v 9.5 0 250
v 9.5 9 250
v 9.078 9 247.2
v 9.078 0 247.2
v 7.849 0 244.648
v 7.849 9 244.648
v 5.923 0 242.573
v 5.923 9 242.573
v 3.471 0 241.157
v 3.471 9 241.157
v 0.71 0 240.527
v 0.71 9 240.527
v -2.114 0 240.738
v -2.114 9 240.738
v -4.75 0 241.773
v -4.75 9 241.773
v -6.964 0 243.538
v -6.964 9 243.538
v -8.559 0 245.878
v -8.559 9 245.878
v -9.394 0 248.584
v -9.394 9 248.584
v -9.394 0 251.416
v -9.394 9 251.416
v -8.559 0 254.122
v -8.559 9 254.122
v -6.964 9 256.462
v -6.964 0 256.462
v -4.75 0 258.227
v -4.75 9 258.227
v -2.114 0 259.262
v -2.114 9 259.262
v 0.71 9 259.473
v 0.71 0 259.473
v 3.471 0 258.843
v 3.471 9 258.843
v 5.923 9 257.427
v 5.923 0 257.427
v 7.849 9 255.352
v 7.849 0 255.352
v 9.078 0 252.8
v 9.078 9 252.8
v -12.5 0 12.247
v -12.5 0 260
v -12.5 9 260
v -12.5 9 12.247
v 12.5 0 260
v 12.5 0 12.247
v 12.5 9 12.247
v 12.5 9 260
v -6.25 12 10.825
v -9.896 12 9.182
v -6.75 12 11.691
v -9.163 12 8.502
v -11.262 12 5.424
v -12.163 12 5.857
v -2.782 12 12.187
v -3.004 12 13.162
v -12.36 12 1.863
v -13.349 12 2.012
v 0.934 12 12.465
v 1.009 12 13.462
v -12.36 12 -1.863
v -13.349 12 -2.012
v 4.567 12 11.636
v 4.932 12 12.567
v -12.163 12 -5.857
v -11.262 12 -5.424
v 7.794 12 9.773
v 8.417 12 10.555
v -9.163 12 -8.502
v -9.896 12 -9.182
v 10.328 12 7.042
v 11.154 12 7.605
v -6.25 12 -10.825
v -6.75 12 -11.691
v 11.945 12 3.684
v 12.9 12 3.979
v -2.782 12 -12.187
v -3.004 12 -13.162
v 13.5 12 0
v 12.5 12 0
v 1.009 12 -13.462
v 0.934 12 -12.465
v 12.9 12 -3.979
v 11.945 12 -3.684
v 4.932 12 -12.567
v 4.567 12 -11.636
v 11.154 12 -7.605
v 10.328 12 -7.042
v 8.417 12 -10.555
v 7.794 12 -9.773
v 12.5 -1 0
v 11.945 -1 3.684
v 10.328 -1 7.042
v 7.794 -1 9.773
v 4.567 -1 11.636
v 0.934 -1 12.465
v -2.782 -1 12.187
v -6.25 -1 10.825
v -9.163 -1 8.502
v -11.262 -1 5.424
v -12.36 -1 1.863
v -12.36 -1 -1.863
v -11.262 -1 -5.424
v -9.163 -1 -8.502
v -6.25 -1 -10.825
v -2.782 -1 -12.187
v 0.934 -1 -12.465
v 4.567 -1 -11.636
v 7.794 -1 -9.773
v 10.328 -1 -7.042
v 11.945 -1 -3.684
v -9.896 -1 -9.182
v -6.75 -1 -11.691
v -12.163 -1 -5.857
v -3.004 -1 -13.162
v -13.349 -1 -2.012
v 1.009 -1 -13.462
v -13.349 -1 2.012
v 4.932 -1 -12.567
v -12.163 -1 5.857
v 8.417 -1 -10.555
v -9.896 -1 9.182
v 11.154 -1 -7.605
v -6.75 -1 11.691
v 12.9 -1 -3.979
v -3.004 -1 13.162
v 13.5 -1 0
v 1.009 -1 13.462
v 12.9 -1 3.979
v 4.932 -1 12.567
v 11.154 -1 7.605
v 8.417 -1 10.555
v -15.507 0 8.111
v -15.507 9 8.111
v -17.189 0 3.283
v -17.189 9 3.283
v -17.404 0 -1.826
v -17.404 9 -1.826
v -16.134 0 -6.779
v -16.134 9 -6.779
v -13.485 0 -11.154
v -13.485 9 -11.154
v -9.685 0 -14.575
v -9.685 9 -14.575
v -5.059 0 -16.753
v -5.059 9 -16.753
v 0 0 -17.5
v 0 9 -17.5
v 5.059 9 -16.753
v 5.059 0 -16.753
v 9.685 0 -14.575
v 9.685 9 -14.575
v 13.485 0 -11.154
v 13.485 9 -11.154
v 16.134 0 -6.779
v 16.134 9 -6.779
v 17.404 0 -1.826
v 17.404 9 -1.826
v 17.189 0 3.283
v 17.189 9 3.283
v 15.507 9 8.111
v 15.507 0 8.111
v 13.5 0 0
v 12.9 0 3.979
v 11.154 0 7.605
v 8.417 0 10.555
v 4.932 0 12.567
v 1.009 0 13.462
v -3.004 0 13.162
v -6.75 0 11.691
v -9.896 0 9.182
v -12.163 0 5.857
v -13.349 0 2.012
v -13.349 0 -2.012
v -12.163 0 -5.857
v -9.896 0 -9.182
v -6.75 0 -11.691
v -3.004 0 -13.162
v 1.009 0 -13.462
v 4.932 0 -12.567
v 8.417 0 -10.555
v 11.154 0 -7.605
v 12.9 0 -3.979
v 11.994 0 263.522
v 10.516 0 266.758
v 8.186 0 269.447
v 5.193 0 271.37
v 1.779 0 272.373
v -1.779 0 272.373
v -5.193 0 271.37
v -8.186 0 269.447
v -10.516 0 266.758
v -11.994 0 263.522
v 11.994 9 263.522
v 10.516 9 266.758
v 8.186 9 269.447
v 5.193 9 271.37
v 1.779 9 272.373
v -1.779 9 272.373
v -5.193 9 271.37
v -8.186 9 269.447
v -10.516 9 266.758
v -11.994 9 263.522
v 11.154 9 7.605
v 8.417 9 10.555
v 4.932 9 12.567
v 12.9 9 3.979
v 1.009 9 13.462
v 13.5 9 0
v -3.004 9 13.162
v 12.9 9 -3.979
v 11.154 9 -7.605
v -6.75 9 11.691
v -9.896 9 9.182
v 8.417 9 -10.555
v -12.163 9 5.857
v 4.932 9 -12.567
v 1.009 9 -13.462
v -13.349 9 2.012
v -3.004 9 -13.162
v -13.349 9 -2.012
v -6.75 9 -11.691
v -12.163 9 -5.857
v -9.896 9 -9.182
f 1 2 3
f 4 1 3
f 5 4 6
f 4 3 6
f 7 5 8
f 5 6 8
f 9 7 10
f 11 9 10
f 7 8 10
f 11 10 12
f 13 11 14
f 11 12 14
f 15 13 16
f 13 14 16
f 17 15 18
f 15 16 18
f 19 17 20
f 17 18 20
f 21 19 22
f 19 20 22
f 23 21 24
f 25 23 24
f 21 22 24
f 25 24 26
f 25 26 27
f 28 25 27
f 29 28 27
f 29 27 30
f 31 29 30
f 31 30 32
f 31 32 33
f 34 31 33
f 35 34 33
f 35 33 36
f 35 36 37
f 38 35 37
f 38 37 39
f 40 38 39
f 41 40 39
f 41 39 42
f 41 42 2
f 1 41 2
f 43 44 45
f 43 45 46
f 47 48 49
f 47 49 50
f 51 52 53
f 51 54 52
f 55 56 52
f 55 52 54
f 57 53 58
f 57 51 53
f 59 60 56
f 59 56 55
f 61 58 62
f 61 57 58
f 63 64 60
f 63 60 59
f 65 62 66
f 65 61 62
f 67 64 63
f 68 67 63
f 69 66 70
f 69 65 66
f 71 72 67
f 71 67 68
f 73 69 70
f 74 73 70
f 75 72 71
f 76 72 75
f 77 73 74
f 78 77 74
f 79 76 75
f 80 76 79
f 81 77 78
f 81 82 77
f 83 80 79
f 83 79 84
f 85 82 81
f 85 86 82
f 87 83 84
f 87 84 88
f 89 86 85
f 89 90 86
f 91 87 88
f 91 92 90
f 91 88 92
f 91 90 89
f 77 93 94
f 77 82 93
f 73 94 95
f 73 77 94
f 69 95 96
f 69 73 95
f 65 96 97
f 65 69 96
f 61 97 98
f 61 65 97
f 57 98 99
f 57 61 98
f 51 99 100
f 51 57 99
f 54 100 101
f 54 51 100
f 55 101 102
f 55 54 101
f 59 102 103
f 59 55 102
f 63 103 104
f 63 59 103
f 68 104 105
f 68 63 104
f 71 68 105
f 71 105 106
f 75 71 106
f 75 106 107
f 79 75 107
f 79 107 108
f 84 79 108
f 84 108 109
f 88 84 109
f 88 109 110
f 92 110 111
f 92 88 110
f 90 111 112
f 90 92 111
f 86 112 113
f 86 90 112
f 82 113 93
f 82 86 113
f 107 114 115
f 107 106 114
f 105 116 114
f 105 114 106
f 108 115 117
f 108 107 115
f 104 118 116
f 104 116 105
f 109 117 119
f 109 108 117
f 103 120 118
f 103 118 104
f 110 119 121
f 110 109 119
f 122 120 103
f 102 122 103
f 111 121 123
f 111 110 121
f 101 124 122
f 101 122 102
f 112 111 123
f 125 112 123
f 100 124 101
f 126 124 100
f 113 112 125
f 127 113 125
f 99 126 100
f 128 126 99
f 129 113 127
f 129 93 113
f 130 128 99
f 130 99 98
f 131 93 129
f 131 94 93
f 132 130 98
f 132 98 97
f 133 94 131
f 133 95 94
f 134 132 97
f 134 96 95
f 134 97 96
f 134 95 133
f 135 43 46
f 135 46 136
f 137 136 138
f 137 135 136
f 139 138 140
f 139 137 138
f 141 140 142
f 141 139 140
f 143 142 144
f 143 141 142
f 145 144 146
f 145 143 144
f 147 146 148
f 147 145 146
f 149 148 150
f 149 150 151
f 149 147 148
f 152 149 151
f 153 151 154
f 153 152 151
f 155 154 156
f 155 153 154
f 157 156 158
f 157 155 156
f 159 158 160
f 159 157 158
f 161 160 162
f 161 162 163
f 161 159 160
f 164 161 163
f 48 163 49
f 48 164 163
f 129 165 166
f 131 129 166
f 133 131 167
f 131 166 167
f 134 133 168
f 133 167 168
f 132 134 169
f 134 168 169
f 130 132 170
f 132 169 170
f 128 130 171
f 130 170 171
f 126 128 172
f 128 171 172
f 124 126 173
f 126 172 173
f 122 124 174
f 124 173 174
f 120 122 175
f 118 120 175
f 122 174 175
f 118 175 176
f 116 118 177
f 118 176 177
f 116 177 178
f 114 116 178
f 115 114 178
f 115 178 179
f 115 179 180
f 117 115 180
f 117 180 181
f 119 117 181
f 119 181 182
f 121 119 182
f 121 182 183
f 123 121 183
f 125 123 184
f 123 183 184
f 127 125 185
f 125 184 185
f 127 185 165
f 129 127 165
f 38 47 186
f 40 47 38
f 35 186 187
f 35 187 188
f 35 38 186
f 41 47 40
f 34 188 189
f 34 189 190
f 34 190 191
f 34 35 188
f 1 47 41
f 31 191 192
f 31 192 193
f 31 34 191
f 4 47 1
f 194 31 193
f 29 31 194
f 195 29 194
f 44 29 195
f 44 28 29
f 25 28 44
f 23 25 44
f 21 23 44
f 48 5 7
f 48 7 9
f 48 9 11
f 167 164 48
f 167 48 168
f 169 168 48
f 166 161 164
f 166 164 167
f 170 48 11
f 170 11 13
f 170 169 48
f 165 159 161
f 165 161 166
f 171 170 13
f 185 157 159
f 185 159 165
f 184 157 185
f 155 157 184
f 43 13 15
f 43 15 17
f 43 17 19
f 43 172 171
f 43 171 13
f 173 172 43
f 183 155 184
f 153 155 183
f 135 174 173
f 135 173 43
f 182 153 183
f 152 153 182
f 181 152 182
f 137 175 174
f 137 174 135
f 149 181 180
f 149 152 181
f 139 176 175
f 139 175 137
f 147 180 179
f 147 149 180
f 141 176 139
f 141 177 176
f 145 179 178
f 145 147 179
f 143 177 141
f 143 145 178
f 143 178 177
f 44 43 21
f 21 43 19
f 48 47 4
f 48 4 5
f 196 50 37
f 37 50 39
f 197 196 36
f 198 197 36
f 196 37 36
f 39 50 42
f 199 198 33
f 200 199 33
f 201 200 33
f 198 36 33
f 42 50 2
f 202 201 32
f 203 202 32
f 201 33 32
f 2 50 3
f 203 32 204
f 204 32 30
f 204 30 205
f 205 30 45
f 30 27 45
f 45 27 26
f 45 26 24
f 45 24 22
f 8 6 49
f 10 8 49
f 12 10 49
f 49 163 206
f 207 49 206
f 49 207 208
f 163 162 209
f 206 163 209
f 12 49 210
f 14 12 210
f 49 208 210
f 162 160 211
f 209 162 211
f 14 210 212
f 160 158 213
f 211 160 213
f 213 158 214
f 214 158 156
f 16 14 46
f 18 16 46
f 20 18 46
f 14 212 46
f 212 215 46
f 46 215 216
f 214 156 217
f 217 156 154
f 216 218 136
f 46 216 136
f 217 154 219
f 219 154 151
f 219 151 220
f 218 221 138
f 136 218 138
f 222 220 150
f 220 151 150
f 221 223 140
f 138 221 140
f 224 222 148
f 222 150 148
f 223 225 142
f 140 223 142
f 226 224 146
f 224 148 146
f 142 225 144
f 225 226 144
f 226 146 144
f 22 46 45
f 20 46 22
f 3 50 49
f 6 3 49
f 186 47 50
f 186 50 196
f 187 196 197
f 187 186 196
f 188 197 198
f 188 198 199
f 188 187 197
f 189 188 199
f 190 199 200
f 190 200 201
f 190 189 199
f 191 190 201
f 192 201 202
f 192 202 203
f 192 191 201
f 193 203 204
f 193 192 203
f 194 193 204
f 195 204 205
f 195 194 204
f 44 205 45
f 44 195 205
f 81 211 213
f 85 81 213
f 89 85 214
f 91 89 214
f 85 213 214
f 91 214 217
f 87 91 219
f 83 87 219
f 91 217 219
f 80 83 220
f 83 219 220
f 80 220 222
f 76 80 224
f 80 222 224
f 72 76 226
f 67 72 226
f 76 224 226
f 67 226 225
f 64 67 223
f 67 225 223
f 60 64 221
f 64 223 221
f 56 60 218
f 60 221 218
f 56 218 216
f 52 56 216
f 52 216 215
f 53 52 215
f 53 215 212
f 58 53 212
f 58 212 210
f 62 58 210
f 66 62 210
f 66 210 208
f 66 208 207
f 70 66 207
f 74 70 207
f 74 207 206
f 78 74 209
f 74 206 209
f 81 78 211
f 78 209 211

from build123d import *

# Parameters (mm, degrees)
EXTRUDE_1_DEPTH     = 9
SKETCH_2_R          = 12.5
CUT_EXTRUDE_1_DEPTH = 10
SKETCH_3_R          = 13.5
SKETCH_3_R_2        = 12.5
EXTRUDE_2_DEPTH     = 3
SKETCH_4_R          = 13.5
SKETCH_4_R_2        = 12.5
EXTRUDE_3_DEPTH     = 1
SKETCH_5_R          = 9.5
CUT_EXTRUDE_2_DEPTH = 11


with BuildPart() as part:
    # 스케치1 → 보스-돌출1 (new body)
    with BuildSketch(Plane(origin=(0, 0, 0), x_dir=(1, 0, 0), z_dir=(0, 1, 0))):
        with BuildLine():
            Line((-12.5, -260), (-12.5, -12.247448714))
            ThreePointArc((-12.5, -12.247448714), (0, 17.5), (12.5, -12.247448714))
            Line((12.5, -12.247448714), (12.5, -260))
            ThreePointArc((12.5, -260), (0, -272.5), (-12.5, -260))
        make_face()
    extrude(amount=EXTRUDE_1_DEPTH)

    # 스케치2 → 컷-돌출1 (cut, through all)
    with BuildSketch(Plane(origin=(0, 9, 0), x_dir=(1, 0, 0), z_dir=(0, 1, 0))):
        Circle(SKETCH_2_R)
    extrude(amount=-CUT_EXTRUDE_1_DEPTH, mode=Mode.SUBTRACT)

    # 스케치3 → 보스-돌출2 (add)
    with BuildSketch(Plane(origin=(0, 9, 0), x_dir=(1, 0, 0), z_dir=(0, 1, 0))):
        Circle(SKETCH_3_R)
        Circle(SKETCH_3_R_2, mode=Mode.SUBTRACT)
    extrude(amount=EXTRUDE_2_DEPTH)

    # 스케치4 → 보스-돌출3 (add)
    with BuildSketch(Plane.XZ):
        Circle(SKETCH_4_R)
        Circle(SKETCH_4_R_2, mode=Mode.SUBTRACT)
    extrude(amount=EXTRUDE_3_DEPTH)

    # 스케치5 → 컷-돌출2 (cut, through all)
    with BuildSketch(Plane(origin=(0, 9, 0), x_dir=(1, 0, 0), z_dir=(0, 1, 0))):
        with Locations((0, -250)):
            Circle(SKETCH_5_R)
    extrude(amount=-CUT_EXTRUDE_2_DEPTH, mode=Mode.SUBTRACT)


solid = part.part
